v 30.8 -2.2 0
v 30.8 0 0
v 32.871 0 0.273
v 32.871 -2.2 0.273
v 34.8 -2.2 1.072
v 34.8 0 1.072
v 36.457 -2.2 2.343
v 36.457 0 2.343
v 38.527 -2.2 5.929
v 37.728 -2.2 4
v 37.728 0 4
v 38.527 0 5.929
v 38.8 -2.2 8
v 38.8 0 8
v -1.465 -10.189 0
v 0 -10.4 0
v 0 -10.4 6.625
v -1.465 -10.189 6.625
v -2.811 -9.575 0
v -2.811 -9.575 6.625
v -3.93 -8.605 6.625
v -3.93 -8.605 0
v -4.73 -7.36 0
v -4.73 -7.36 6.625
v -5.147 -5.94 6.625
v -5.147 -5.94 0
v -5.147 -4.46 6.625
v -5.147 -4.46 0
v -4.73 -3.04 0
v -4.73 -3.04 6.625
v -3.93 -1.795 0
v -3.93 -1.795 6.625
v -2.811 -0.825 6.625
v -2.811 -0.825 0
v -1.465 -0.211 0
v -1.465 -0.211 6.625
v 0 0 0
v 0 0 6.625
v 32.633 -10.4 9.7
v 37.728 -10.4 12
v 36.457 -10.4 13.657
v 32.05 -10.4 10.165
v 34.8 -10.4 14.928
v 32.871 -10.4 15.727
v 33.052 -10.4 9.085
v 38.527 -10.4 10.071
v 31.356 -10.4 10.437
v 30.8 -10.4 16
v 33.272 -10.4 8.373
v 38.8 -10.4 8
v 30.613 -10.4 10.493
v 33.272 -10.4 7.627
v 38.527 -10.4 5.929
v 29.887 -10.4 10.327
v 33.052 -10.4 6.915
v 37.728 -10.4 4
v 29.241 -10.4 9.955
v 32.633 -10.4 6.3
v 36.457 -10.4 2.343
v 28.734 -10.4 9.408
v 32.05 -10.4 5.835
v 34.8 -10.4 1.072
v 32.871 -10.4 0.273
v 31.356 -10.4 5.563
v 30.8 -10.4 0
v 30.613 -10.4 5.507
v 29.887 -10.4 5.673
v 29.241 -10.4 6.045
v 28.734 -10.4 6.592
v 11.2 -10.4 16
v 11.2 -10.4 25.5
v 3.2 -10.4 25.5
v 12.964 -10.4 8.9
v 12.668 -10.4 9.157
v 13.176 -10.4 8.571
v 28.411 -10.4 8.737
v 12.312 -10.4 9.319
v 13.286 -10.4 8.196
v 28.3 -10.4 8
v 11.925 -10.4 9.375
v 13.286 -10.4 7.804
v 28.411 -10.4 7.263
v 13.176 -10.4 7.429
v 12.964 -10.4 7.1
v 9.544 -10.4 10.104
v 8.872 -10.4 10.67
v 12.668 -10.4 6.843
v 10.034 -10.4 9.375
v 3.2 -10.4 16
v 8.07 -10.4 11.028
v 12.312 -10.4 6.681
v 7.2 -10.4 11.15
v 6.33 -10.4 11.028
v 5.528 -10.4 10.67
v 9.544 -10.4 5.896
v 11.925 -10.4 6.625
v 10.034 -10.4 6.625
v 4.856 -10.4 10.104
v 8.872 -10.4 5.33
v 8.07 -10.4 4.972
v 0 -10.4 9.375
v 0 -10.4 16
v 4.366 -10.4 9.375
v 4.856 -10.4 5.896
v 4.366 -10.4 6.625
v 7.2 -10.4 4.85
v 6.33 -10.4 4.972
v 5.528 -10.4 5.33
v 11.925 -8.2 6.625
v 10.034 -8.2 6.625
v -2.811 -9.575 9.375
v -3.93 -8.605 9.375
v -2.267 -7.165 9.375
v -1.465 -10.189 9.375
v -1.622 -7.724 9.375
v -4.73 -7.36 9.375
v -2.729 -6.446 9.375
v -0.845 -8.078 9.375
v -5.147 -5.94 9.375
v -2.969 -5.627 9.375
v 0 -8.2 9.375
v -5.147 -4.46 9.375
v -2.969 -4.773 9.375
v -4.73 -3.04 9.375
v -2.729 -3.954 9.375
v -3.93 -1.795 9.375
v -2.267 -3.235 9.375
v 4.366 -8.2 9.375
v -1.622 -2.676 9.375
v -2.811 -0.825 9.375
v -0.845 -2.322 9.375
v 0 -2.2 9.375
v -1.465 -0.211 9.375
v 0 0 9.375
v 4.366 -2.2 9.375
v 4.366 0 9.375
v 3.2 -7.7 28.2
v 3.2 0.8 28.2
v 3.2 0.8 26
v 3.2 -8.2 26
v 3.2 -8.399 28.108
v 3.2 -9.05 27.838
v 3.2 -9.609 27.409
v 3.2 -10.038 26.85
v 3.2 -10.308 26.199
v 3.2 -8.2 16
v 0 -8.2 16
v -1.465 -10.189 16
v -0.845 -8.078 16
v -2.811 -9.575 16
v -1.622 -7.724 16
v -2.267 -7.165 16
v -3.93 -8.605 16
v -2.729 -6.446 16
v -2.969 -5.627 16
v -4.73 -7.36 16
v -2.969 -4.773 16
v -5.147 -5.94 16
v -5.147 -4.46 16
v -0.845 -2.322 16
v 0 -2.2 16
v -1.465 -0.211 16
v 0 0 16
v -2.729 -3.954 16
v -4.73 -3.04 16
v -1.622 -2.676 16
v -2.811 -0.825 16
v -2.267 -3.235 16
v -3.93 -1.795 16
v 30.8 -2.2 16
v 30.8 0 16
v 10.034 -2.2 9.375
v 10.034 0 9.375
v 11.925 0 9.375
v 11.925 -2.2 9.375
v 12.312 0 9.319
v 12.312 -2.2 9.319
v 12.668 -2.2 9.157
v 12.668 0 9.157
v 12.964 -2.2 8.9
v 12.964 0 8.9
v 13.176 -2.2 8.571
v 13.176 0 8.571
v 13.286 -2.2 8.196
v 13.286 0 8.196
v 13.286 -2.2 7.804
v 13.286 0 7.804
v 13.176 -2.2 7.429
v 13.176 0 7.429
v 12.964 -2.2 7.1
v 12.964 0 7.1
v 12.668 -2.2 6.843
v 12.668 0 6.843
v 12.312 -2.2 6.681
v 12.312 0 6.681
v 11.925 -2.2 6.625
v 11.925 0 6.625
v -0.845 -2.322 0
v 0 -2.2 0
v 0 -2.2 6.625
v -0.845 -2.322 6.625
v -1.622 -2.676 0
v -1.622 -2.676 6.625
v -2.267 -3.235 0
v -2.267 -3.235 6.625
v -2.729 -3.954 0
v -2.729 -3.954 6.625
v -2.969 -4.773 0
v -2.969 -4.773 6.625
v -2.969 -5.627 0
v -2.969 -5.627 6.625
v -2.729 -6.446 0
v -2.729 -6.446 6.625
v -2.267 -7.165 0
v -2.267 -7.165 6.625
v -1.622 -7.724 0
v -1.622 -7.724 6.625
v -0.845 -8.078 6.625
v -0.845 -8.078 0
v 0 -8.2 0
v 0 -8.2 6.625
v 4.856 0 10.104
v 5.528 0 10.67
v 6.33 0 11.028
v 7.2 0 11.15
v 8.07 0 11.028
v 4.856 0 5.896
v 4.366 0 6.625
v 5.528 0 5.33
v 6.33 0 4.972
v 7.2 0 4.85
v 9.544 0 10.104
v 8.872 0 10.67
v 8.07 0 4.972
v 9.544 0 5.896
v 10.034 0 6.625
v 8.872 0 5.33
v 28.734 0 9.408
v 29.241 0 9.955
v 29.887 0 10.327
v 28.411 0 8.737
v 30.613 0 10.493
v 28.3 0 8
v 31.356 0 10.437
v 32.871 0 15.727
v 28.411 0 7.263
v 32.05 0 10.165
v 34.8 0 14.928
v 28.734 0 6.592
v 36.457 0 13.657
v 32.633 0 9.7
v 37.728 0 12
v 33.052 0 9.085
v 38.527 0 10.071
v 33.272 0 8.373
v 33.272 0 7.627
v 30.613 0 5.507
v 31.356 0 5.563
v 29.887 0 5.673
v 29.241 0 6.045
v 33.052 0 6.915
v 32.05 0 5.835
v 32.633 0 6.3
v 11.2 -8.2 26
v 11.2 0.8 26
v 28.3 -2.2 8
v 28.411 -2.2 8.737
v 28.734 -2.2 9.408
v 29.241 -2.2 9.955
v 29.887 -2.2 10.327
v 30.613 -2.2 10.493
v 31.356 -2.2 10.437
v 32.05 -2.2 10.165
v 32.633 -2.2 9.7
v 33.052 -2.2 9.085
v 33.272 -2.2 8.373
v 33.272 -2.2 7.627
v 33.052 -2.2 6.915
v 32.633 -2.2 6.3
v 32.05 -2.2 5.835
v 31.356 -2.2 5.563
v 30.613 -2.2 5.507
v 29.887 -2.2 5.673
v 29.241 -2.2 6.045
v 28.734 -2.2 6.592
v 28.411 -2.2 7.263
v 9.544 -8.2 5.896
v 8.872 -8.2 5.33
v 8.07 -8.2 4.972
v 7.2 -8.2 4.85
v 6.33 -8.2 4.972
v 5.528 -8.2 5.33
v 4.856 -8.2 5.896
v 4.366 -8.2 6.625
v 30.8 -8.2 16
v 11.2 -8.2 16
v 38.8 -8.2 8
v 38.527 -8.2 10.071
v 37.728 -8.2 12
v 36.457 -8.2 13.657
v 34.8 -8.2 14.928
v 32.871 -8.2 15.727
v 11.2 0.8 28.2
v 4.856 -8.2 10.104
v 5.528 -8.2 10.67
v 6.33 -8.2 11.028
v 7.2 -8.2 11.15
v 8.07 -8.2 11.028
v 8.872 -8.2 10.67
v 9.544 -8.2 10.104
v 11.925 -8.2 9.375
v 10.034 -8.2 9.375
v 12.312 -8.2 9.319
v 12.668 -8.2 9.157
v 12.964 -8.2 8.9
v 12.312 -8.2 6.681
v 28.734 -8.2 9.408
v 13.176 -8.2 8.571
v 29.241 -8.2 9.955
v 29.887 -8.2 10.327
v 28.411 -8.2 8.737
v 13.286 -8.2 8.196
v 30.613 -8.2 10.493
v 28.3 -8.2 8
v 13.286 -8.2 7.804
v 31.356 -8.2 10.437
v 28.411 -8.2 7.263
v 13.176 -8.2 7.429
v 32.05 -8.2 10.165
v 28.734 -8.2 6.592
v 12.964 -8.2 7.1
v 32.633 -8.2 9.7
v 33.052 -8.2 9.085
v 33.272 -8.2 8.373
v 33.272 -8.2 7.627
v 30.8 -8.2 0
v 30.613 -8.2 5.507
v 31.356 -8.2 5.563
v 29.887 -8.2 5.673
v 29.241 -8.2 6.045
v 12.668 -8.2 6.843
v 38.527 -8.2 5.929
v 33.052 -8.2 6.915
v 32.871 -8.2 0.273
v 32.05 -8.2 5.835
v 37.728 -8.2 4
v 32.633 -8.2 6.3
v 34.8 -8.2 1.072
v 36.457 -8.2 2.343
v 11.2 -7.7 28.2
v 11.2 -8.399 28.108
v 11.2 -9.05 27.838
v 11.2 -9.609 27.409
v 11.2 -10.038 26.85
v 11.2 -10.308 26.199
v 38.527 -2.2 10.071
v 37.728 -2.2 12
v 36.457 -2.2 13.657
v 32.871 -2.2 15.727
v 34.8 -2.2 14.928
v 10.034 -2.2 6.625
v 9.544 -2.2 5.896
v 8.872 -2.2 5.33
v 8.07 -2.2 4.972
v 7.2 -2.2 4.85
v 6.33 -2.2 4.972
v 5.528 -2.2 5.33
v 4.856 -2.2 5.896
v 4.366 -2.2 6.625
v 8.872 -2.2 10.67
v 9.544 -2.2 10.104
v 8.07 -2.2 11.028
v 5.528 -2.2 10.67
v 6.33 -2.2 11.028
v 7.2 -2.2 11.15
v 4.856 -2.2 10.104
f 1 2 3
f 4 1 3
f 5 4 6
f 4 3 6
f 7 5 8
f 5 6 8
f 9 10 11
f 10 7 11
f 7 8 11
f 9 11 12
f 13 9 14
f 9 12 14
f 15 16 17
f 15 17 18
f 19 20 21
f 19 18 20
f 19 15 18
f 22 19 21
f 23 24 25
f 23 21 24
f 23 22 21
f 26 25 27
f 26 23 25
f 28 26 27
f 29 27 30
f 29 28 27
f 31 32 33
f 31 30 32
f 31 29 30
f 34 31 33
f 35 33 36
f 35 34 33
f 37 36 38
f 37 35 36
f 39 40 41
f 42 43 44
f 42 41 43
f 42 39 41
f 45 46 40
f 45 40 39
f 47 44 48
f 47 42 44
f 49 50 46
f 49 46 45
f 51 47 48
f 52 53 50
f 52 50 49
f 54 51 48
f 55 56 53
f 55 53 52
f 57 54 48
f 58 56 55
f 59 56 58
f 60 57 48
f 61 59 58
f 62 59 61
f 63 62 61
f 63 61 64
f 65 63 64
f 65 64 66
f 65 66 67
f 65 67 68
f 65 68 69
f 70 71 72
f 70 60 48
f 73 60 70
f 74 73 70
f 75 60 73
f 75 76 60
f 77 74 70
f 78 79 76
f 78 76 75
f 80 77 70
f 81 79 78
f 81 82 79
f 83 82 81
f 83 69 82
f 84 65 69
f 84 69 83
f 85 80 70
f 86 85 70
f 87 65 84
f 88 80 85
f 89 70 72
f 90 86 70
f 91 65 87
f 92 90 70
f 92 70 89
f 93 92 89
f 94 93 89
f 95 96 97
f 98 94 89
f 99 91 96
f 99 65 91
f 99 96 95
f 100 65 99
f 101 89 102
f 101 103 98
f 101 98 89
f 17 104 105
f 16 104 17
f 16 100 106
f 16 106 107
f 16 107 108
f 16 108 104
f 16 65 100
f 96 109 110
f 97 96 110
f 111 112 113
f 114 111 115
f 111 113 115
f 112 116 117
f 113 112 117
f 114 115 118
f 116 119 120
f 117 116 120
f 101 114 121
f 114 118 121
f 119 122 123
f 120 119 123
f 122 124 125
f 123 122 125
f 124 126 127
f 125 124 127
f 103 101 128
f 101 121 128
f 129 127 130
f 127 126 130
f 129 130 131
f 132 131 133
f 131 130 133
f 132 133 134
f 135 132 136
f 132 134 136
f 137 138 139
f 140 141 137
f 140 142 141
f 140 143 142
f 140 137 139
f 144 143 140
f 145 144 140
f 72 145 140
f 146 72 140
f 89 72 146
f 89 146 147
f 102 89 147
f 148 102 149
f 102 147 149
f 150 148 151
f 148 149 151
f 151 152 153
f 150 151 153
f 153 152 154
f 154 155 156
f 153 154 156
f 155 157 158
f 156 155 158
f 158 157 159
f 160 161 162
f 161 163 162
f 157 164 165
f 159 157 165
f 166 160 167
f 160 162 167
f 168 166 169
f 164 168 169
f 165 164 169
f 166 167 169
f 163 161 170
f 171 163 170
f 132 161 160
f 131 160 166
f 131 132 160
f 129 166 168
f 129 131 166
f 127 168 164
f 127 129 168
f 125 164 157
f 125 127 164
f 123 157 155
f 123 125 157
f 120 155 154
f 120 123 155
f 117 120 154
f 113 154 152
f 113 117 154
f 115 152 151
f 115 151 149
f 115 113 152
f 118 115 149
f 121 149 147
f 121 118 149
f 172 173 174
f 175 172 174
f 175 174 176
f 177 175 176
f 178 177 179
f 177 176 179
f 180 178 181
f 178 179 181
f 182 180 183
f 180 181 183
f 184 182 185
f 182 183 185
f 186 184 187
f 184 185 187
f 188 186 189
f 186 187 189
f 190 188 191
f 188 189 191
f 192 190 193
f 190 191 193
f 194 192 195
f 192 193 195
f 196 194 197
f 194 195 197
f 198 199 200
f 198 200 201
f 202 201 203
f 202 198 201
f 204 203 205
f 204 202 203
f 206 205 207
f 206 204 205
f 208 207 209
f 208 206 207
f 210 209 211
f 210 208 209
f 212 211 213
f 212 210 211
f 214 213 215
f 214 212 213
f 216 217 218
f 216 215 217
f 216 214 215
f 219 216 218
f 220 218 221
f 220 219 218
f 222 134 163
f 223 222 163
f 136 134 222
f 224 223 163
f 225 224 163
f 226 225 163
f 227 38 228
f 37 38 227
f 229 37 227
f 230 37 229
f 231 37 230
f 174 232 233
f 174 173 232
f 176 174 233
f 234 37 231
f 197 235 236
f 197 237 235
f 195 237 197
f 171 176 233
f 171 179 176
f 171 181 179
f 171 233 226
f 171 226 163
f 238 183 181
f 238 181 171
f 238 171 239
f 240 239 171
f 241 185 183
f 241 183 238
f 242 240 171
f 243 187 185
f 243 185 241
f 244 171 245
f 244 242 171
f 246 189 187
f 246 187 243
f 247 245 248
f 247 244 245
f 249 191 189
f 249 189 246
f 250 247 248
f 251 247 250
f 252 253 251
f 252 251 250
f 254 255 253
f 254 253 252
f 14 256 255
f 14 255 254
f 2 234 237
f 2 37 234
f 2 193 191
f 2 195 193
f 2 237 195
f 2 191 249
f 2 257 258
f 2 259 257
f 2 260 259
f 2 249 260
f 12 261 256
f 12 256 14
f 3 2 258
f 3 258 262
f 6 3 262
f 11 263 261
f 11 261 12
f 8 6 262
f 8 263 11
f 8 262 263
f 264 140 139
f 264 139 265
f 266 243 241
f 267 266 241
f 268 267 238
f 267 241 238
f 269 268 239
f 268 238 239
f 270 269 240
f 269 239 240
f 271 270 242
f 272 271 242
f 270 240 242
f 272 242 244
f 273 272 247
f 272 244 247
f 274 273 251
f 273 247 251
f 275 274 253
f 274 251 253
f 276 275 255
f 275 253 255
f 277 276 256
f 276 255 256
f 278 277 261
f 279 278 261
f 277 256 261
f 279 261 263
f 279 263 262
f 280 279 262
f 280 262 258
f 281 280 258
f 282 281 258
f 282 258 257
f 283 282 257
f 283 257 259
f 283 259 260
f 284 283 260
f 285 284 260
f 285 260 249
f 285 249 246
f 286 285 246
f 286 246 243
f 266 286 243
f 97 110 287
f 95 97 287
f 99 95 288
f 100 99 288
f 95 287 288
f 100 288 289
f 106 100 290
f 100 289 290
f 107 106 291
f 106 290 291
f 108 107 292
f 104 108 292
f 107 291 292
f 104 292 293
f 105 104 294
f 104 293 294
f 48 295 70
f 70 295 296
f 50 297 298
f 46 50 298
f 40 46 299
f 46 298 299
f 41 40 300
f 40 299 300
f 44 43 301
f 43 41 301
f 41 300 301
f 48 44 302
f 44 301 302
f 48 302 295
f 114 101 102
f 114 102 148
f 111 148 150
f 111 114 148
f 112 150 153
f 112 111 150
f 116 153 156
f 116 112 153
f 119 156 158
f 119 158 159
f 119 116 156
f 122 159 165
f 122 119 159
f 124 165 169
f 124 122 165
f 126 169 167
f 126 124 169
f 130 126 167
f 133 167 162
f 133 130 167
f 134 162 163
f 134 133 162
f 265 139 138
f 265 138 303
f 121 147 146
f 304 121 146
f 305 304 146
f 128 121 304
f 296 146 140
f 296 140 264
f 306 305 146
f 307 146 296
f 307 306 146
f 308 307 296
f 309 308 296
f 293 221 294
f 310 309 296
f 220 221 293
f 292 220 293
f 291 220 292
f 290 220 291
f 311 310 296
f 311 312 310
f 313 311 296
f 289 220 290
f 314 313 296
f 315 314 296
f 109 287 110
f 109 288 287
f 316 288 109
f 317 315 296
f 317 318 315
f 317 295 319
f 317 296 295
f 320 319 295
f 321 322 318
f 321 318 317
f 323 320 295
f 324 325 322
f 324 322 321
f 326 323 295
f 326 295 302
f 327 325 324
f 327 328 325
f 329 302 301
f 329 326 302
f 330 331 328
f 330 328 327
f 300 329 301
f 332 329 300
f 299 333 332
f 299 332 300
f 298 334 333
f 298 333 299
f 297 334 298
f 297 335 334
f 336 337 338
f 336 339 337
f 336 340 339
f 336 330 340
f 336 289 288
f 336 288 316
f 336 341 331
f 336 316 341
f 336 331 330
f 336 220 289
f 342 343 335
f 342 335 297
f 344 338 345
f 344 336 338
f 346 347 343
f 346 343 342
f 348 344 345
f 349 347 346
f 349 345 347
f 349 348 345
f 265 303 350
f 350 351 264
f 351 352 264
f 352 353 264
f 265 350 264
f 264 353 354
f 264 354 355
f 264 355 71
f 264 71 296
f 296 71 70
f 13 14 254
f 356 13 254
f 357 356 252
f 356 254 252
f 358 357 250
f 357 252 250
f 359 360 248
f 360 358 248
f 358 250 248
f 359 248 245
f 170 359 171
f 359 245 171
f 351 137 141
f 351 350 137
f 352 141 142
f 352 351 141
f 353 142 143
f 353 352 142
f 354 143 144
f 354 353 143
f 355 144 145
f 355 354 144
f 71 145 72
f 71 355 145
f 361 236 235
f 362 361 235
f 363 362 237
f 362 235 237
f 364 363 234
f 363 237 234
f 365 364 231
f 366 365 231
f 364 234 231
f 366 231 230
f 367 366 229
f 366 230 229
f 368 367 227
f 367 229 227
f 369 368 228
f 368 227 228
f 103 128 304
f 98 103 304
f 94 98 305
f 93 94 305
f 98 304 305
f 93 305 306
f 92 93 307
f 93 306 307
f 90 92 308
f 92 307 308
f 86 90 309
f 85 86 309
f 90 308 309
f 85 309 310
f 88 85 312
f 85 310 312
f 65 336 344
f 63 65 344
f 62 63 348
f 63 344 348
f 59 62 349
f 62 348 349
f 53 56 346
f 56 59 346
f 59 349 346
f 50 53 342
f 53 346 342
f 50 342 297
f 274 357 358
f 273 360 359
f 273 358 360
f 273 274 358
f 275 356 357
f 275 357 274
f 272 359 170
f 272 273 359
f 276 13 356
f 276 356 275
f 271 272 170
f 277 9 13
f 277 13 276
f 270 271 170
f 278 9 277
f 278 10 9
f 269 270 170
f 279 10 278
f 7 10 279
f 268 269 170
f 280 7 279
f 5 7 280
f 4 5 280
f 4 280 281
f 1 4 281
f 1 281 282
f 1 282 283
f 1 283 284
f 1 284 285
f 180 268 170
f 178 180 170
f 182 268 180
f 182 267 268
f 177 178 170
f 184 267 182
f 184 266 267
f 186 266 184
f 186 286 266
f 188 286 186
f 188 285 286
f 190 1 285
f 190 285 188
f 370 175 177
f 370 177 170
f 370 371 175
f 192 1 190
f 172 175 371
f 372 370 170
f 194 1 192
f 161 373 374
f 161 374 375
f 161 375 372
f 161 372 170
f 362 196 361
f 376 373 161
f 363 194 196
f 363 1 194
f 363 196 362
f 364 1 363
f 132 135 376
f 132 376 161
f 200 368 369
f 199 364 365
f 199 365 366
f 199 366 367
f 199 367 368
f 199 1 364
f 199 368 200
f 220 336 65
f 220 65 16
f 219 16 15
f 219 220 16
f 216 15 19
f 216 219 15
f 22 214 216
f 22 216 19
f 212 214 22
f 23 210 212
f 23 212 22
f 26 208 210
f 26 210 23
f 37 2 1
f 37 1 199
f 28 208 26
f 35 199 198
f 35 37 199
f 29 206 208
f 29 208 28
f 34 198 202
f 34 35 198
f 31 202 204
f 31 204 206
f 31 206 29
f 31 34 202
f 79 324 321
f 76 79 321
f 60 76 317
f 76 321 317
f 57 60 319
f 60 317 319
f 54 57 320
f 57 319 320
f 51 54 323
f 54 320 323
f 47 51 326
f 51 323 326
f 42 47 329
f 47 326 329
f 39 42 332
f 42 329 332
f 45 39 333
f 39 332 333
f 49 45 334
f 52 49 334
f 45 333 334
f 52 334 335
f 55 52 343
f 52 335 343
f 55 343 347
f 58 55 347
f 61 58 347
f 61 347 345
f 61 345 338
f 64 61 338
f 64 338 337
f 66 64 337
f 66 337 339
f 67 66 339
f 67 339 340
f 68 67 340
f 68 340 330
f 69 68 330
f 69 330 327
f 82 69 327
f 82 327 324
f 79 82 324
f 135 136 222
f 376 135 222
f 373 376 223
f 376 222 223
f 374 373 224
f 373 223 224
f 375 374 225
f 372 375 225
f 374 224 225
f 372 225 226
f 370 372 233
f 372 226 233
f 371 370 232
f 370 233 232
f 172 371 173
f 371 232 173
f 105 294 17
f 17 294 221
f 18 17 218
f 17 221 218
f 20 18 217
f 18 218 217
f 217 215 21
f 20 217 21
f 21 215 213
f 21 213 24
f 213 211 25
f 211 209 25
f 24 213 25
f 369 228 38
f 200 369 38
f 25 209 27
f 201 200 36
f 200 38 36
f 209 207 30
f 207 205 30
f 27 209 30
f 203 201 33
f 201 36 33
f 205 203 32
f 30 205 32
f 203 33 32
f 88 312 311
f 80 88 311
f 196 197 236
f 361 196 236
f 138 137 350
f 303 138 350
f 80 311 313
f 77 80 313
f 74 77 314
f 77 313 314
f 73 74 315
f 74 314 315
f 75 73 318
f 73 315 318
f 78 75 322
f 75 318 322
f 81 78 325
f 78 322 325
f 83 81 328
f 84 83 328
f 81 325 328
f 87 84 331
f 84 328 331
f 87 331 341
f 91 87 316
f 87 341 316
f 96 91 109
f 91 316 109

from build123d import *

# Parameters (mm, degrees)
SALIENTE_EXTRUIR1_DEPTH = 16
CORTAR_EXTRUIR1_REACH   = 45.239
CROQUIS2_W              = 5.2
CROQUIS2_H              = 2.75
CROQUIS2_R              = 2.5
CROQUIS5_W              = 4
CROQUIS5_H              = 2.2
SALIENTE_EXTRUIR4_DEPTH = 12.2
CROQUIS6_W              = 8
CROQUIS6_H              = 2.2
SALIENTE_EXTRUIR5_DEPTH = 9
REDONDEO2_R             = 2.7


with BuildPart() as part:
    # Croquis1 → Saliente-Extruir1 (new body)
    with BuildSketch(Plane.XY):
        with BuildLine():
            Line((0, -8.2), (38.8, -8.2))
            Line((38.8, -8.2), (38.8, -10.4))
            Line((38.8, -10.4), (0, -10.4))
            ThreePointArc((0, -10.4), (-5.2, -5.2), (0, 0))
            Line((0, 0), (38.8, 0))
            Line((38.8, 0), (38.8, -2.2))
            Line((38.8, -2.2), (0, -2.2))
            ThreePointArc((0, -2.2), (-3, -5.2), (0, -8.2))
        make_face()
    extrude(amount=SALIENTE_EXTRUIR1_DEPTH)

    # Cortar-Extruir1: up to this face of the body (flat: up to its plane)
    cortar_extruir1_end = Plane(part.part.faces().sort_by_distance((19.4, -10.4, 8))[0])
    # Croquis2 → Cortar-Extruir1 (cut, up to the picked face)
    with BuildSketch(Plane(origin=(0, 0, 0), x_dir=(1, 0, 0), z_dir=(0, 1, 0)), mode=Mode.PRIVATE) as cortar_extruir1_sk1:
        with Locations((-2.6, -8)):
            Rectangle(CROQUIS2_W, CROQUIS2_H)
    cortar_extruir1_tool1 = split(extrude(cortar_extruir1_sk1.sketch, amount=-CORTAR_EXTRUIR1_REACH, mode=Mode.PRIVATE), bisect_by=cortar_extruir1_end, keep=Keep.BOTH, mode=Mode.PRIVATE)
    # Croquis2 → Cortar-Extruir1 (cut, up to the picked face)
    with BuildSketch(Plane(origin=(0, 0, 0), x_dir=(1, 0, 0), z_dir=(0, 1, 0)), mode=Mode.PRIVATE) as cortar_extruir1_sk2:
        with BuildLine():
            Line((4.36594372, -6.625), (0, -6.625))
            Line((0, -6.625), (0, -9.375))
            Line((0, -9.375), (4.36594372, -9.375))
            ThreePointArc((4.36594372, -9.375), (4.05, -8), (4.36594372, -6.625))
        make_face()
    cortar_extruir1_tool2 = split(extrude(cortar_extruir1_sk2.sketch, amount=-CORTAR_EXTRUIR1_REACH, mode=Mode.PRIVATE), bisect_by=cortar_extruir1_end, keep=Keep.BOTH, mode=Mode.PRIVATE)
    # Croquis2 → Cortar-Extruir1 (cut, up to the picked face)
    with BuildSketch(Plane(origin=(0, 0, 0), x_dir=(1, 0, 0), z_dir=(0, 1, 0)), mode=Mode.PRIVATE) as cortar_extruir1_sk3:
        with BuildLine():
            ThreePointArc((10.03405628, -6.625), (7.2, -4.85), (4.36594372, -6.625))
            Line((4.36594372, -6.625), (10.03405628, -6.625))
        make_face()
    cortar_extruir1_tool3 = split(extrude(cortar_extruir1_sk3.sketch, amount=-CORTAR_EXTRUIR1_REACH, mode=Mode.PRIVATE), bisect_by=cortar_extruir1_end, keep=Keep.BOTH, mode=Mode.PRIVATE)
    # Croquis2 → Cortar-Extruir1 (cut, up to the picked face)
    with BuildSketch(Plane(origin=(0, 0, 0), x_dir=(1, 0, 0), z_dir=(0, 1, 0)), mode=Mode.PRIVATE) as cortar_extruir1_sk4:
        with BuildLine():
            Line((10.03405628, -6.625), (4.36594372, -6.625))
            ThreePointArc((4.36594372, -6.625), (4.05, -8), (4.36594372, -9.375))
            Line((4.36594372, -9.375), (10.03405628, -9.375))
            ThreePointArc((10.03405628, -9.375), (10.26999815, -8.705415735), (10.35, -8))
            ThreePointArc((10.35, -8), (10.26999815, -7.294584265), (10.03405628, -6.625))
        make_face()
    cortar_extruir1_tool4 = split(extrude(cortar_extruir1_sk4.sketch, amount=-CORTAR_EXTRUIR1_REACH, mode=Mode.PRIVATE), bisect_by=cortar_extruir1_end, keep=Keep.BOTH, mode=Mode.PRIVATE)
    # Croquis2 → Cortar-Extruir1 (cut, up to the picked face)
    with BuildSketch(Plane(origin=(0, 0, 0), x_dir=(1, 0, 0), z_dir=(0, 1, 0)), mode=Mode.PRIVATE) as cortar_extruir1_sk5:
        with BuildLine():
            Line((10.03405628, -9.375), (4.36594372, -9.375))
            ThreePointArc((4.36594372, -9.375), (7.2, -11.15), (10.03405628, -9.375))
        make_face()
    cortar_extruir1_tool5 = split(extrude(cortar_extruir1_sk5.sketch, amount=-CORTAR_EXTRUIR1_REACH, mode=Mode.PRIVATE), bisect_by=cortar_extruir1_end, keep=Keep.BOTH, mode=Mode.PRIVATE)
    # Croquis2 → Cortar-Extruir1 (cut, up to the picked face)
    with BuildSketch(Plane(origin=(0, 0, 0), x_dir=(1, 0, 0), z_dir=(0, 1, 0)), mode=Mode.PRIVATE) as cortar_extruir1_sk6:
        with BuildLine():
            Line((11.925, -6.625), (10.03405628, -6.625))
            ThreePointArc((10.03405628, -6.625), (10.26999815, -7.294584265), (10.35, -8))
            ThreePointArc((10.35, -8), (10.26999815, -8.705415735), (10.03405628, -9.375))
            Line((10.03405628, -9.375), (11.925, -9.375))
            ThreePointArc((11.925, -9.375), (13.3, -8), (11.925, -6.625))
        make_face()
    cortar_extruir1_tool6 = split(extrude(cortar_extruir1_sk6.sketch, amount=-CORTAR_EXTRUIR1_REACH, mode=Mode.PRIVATE), bisect_by=cortar_extruir1_end, keep=Keep.BOTH, mode=Mode.PRIVATE)
    # Croquis2 → Cortar-Extruir1 (cut, up to the picked face)
    with BuildSketch(Plane(origin=(0, 0, 0), x_dir=(1, 0, 0), z_dir=(0, 1, 0)), mode=Mode.PRIVATE) as cortar_extruir1_sk7:
        with Locations(Location((30.8, -8, 0), (0, 0, 180))):
            Circle(CROQUIS2_R)
    cortar_extruir1_tool7 = split(extrude(cortar_extruir1_sk7.sketch, amount=-CORTAR_EXTRUIR1_REACH, mode=Mode.PRIVATE), bisect_by=cortar_extruir1_end, keep=Keep.BOTH, mode=Mode.PRIVATE)
    # Croquis2 → Cortar-Extruir1 (cut, up to the picked face)
    with BuildSketch(Plane(origin=(0, 0, 0), x_dir=(1, 0, 0), z_dir=(0, 1, 0)), mode=Mode.PRIVATE) as cortar_extruir1_sk8:
        with BuildLine():
            Line((38.8, 0), (30.8, 0))
            ThreePointArc((30.8, 0), (36.456854249, -2.343145751), (38.8, -8))
            Line((38.8, -8), (38.8, 0))
        make_face()
    cortar_extruir1_tool8 = split(extrude(cortar_extruir1_sk8.sketch, amount=-CORTAR_EXTRUIR1_REACH, mode=Mode.PRIVATE), bisect_by=cortar_extruir1_end, keep=Keep.BOTH, mode=Mode.PRIVATE)
    # Croquis2 → Cortar-Extruir1 (cut, up to the picked face)
    with BuildSketch(Plane(origin=(0, 0, 0), x_dir=(1, 0, 0), z_dir=(0, 1, 0)), mode=Mode.PRIVATE) as cortar_extruir1_sk9:
        with BuildLine():
            Line((38.8, -16), (38.8, -8))
            ThreePointArc((38.8, -8), (36.456854249, -13.656854249), (30.8, -16))
            Line((30.8, -16), (38.8, -16))
        make_face()
    cortar_extruir1_tool9 = split(extrude(cortar_extruir1_sk9.sketch, amount=-CORTAR_EXTRUIR1_REACH, mode=Mode.PRIVATE), bisect_by=cortar_extruir1_end, keep=Keep.BOTH, mode=Mode.PRIVATE)
    add(cortar_extruir1_tool1.solids().sort_by(Axis((-2.6, 0, 8), (0, -1, 0)))[0], mode=Mode.SUBTRACT)
    add(cortar_extruir1_tool2.solids().sort_by(Axis((2.077605, 0, 8), (0, -1, 0)))[0], mode=Mode.SUBTRACT)
    add(cortar_extruir1_tool3.solids().sort_by(Axis((7.2, 0, 5.894461), (0, -1, 0)))[0], mode=Mode.SUBTRACT)
    add(cortar_extruir1_tool4.solids().sort_by(Axis((7.2, 0, 8), (0, -1, 0)))[0], mode=Mode.SUBTRACT)
    add(cortar_extruir1_tool5.solids().sort_by(Axis((7.2, 0, 10.105539), (0, -1, 0)))[0], mode=Mode.SUBTRACT)
    add(cortar_extruir1_tool6.solids().sort_by(Axis((11.641399, 0, 8), (0, -1, 0)))[0], mode=Mode.SUBTRACT)
    add(cortar_extruir1_tool7.solids().sort_by(Axis((30.8, 0, 8), (0, -1, 0)))[0], mode=Mode.SUBTRACT)
    add(cortar_extruir1_tool8.solids().sort_by(Axis((37.013056, 0, 1.786944), (0, -1, 0)))[0], mode=Mode.SUBTRACT)
    add(cortar_extruir1_tool9.solids().sort_by(Axis((37.013056, 0, 14.213056), (0, -1, 0)))[0], mode=Mode.SUBTRACT)

    # Croquis5 → Saliente-Extruir4 (add)
    with BuildSketch(Plane.XY.offset(16)):
        with Locations((5.2, -9.3)):
            Rectangle(CROQUIS5_W, CROQUIS5_H)
        with Locations((9.2, -9.3)):
            Rectangle(CROQUIS5_W, CROQUIS5_H)
    extrude(amount=SALIENTE_EXTRUIR4_DEPTH)

    # Croquis6 → Saliente-Extruir5 (add)
    with BuildSketch(Plane(origin=(0, -8.2, 0), x_dir=(1, 0, 0), z_dir=(0, 1, 0))):
        with Locations((7.2, -27.1)):
            Rectangle(CROQUIS6_W, CROQUIS6_H)
    extrude(amount=SALIENTE_EXTRUIR5_DEPTH)

    # Redondeo2
    redondeo2_edges = [part.edges().sort_by_distance(p)[0] for p in [
        (7.2, -10.4, 28.2),
    ]]
    fillet(redondeo2_edges, radius=REDONDEO2_R)


solid = part.part
